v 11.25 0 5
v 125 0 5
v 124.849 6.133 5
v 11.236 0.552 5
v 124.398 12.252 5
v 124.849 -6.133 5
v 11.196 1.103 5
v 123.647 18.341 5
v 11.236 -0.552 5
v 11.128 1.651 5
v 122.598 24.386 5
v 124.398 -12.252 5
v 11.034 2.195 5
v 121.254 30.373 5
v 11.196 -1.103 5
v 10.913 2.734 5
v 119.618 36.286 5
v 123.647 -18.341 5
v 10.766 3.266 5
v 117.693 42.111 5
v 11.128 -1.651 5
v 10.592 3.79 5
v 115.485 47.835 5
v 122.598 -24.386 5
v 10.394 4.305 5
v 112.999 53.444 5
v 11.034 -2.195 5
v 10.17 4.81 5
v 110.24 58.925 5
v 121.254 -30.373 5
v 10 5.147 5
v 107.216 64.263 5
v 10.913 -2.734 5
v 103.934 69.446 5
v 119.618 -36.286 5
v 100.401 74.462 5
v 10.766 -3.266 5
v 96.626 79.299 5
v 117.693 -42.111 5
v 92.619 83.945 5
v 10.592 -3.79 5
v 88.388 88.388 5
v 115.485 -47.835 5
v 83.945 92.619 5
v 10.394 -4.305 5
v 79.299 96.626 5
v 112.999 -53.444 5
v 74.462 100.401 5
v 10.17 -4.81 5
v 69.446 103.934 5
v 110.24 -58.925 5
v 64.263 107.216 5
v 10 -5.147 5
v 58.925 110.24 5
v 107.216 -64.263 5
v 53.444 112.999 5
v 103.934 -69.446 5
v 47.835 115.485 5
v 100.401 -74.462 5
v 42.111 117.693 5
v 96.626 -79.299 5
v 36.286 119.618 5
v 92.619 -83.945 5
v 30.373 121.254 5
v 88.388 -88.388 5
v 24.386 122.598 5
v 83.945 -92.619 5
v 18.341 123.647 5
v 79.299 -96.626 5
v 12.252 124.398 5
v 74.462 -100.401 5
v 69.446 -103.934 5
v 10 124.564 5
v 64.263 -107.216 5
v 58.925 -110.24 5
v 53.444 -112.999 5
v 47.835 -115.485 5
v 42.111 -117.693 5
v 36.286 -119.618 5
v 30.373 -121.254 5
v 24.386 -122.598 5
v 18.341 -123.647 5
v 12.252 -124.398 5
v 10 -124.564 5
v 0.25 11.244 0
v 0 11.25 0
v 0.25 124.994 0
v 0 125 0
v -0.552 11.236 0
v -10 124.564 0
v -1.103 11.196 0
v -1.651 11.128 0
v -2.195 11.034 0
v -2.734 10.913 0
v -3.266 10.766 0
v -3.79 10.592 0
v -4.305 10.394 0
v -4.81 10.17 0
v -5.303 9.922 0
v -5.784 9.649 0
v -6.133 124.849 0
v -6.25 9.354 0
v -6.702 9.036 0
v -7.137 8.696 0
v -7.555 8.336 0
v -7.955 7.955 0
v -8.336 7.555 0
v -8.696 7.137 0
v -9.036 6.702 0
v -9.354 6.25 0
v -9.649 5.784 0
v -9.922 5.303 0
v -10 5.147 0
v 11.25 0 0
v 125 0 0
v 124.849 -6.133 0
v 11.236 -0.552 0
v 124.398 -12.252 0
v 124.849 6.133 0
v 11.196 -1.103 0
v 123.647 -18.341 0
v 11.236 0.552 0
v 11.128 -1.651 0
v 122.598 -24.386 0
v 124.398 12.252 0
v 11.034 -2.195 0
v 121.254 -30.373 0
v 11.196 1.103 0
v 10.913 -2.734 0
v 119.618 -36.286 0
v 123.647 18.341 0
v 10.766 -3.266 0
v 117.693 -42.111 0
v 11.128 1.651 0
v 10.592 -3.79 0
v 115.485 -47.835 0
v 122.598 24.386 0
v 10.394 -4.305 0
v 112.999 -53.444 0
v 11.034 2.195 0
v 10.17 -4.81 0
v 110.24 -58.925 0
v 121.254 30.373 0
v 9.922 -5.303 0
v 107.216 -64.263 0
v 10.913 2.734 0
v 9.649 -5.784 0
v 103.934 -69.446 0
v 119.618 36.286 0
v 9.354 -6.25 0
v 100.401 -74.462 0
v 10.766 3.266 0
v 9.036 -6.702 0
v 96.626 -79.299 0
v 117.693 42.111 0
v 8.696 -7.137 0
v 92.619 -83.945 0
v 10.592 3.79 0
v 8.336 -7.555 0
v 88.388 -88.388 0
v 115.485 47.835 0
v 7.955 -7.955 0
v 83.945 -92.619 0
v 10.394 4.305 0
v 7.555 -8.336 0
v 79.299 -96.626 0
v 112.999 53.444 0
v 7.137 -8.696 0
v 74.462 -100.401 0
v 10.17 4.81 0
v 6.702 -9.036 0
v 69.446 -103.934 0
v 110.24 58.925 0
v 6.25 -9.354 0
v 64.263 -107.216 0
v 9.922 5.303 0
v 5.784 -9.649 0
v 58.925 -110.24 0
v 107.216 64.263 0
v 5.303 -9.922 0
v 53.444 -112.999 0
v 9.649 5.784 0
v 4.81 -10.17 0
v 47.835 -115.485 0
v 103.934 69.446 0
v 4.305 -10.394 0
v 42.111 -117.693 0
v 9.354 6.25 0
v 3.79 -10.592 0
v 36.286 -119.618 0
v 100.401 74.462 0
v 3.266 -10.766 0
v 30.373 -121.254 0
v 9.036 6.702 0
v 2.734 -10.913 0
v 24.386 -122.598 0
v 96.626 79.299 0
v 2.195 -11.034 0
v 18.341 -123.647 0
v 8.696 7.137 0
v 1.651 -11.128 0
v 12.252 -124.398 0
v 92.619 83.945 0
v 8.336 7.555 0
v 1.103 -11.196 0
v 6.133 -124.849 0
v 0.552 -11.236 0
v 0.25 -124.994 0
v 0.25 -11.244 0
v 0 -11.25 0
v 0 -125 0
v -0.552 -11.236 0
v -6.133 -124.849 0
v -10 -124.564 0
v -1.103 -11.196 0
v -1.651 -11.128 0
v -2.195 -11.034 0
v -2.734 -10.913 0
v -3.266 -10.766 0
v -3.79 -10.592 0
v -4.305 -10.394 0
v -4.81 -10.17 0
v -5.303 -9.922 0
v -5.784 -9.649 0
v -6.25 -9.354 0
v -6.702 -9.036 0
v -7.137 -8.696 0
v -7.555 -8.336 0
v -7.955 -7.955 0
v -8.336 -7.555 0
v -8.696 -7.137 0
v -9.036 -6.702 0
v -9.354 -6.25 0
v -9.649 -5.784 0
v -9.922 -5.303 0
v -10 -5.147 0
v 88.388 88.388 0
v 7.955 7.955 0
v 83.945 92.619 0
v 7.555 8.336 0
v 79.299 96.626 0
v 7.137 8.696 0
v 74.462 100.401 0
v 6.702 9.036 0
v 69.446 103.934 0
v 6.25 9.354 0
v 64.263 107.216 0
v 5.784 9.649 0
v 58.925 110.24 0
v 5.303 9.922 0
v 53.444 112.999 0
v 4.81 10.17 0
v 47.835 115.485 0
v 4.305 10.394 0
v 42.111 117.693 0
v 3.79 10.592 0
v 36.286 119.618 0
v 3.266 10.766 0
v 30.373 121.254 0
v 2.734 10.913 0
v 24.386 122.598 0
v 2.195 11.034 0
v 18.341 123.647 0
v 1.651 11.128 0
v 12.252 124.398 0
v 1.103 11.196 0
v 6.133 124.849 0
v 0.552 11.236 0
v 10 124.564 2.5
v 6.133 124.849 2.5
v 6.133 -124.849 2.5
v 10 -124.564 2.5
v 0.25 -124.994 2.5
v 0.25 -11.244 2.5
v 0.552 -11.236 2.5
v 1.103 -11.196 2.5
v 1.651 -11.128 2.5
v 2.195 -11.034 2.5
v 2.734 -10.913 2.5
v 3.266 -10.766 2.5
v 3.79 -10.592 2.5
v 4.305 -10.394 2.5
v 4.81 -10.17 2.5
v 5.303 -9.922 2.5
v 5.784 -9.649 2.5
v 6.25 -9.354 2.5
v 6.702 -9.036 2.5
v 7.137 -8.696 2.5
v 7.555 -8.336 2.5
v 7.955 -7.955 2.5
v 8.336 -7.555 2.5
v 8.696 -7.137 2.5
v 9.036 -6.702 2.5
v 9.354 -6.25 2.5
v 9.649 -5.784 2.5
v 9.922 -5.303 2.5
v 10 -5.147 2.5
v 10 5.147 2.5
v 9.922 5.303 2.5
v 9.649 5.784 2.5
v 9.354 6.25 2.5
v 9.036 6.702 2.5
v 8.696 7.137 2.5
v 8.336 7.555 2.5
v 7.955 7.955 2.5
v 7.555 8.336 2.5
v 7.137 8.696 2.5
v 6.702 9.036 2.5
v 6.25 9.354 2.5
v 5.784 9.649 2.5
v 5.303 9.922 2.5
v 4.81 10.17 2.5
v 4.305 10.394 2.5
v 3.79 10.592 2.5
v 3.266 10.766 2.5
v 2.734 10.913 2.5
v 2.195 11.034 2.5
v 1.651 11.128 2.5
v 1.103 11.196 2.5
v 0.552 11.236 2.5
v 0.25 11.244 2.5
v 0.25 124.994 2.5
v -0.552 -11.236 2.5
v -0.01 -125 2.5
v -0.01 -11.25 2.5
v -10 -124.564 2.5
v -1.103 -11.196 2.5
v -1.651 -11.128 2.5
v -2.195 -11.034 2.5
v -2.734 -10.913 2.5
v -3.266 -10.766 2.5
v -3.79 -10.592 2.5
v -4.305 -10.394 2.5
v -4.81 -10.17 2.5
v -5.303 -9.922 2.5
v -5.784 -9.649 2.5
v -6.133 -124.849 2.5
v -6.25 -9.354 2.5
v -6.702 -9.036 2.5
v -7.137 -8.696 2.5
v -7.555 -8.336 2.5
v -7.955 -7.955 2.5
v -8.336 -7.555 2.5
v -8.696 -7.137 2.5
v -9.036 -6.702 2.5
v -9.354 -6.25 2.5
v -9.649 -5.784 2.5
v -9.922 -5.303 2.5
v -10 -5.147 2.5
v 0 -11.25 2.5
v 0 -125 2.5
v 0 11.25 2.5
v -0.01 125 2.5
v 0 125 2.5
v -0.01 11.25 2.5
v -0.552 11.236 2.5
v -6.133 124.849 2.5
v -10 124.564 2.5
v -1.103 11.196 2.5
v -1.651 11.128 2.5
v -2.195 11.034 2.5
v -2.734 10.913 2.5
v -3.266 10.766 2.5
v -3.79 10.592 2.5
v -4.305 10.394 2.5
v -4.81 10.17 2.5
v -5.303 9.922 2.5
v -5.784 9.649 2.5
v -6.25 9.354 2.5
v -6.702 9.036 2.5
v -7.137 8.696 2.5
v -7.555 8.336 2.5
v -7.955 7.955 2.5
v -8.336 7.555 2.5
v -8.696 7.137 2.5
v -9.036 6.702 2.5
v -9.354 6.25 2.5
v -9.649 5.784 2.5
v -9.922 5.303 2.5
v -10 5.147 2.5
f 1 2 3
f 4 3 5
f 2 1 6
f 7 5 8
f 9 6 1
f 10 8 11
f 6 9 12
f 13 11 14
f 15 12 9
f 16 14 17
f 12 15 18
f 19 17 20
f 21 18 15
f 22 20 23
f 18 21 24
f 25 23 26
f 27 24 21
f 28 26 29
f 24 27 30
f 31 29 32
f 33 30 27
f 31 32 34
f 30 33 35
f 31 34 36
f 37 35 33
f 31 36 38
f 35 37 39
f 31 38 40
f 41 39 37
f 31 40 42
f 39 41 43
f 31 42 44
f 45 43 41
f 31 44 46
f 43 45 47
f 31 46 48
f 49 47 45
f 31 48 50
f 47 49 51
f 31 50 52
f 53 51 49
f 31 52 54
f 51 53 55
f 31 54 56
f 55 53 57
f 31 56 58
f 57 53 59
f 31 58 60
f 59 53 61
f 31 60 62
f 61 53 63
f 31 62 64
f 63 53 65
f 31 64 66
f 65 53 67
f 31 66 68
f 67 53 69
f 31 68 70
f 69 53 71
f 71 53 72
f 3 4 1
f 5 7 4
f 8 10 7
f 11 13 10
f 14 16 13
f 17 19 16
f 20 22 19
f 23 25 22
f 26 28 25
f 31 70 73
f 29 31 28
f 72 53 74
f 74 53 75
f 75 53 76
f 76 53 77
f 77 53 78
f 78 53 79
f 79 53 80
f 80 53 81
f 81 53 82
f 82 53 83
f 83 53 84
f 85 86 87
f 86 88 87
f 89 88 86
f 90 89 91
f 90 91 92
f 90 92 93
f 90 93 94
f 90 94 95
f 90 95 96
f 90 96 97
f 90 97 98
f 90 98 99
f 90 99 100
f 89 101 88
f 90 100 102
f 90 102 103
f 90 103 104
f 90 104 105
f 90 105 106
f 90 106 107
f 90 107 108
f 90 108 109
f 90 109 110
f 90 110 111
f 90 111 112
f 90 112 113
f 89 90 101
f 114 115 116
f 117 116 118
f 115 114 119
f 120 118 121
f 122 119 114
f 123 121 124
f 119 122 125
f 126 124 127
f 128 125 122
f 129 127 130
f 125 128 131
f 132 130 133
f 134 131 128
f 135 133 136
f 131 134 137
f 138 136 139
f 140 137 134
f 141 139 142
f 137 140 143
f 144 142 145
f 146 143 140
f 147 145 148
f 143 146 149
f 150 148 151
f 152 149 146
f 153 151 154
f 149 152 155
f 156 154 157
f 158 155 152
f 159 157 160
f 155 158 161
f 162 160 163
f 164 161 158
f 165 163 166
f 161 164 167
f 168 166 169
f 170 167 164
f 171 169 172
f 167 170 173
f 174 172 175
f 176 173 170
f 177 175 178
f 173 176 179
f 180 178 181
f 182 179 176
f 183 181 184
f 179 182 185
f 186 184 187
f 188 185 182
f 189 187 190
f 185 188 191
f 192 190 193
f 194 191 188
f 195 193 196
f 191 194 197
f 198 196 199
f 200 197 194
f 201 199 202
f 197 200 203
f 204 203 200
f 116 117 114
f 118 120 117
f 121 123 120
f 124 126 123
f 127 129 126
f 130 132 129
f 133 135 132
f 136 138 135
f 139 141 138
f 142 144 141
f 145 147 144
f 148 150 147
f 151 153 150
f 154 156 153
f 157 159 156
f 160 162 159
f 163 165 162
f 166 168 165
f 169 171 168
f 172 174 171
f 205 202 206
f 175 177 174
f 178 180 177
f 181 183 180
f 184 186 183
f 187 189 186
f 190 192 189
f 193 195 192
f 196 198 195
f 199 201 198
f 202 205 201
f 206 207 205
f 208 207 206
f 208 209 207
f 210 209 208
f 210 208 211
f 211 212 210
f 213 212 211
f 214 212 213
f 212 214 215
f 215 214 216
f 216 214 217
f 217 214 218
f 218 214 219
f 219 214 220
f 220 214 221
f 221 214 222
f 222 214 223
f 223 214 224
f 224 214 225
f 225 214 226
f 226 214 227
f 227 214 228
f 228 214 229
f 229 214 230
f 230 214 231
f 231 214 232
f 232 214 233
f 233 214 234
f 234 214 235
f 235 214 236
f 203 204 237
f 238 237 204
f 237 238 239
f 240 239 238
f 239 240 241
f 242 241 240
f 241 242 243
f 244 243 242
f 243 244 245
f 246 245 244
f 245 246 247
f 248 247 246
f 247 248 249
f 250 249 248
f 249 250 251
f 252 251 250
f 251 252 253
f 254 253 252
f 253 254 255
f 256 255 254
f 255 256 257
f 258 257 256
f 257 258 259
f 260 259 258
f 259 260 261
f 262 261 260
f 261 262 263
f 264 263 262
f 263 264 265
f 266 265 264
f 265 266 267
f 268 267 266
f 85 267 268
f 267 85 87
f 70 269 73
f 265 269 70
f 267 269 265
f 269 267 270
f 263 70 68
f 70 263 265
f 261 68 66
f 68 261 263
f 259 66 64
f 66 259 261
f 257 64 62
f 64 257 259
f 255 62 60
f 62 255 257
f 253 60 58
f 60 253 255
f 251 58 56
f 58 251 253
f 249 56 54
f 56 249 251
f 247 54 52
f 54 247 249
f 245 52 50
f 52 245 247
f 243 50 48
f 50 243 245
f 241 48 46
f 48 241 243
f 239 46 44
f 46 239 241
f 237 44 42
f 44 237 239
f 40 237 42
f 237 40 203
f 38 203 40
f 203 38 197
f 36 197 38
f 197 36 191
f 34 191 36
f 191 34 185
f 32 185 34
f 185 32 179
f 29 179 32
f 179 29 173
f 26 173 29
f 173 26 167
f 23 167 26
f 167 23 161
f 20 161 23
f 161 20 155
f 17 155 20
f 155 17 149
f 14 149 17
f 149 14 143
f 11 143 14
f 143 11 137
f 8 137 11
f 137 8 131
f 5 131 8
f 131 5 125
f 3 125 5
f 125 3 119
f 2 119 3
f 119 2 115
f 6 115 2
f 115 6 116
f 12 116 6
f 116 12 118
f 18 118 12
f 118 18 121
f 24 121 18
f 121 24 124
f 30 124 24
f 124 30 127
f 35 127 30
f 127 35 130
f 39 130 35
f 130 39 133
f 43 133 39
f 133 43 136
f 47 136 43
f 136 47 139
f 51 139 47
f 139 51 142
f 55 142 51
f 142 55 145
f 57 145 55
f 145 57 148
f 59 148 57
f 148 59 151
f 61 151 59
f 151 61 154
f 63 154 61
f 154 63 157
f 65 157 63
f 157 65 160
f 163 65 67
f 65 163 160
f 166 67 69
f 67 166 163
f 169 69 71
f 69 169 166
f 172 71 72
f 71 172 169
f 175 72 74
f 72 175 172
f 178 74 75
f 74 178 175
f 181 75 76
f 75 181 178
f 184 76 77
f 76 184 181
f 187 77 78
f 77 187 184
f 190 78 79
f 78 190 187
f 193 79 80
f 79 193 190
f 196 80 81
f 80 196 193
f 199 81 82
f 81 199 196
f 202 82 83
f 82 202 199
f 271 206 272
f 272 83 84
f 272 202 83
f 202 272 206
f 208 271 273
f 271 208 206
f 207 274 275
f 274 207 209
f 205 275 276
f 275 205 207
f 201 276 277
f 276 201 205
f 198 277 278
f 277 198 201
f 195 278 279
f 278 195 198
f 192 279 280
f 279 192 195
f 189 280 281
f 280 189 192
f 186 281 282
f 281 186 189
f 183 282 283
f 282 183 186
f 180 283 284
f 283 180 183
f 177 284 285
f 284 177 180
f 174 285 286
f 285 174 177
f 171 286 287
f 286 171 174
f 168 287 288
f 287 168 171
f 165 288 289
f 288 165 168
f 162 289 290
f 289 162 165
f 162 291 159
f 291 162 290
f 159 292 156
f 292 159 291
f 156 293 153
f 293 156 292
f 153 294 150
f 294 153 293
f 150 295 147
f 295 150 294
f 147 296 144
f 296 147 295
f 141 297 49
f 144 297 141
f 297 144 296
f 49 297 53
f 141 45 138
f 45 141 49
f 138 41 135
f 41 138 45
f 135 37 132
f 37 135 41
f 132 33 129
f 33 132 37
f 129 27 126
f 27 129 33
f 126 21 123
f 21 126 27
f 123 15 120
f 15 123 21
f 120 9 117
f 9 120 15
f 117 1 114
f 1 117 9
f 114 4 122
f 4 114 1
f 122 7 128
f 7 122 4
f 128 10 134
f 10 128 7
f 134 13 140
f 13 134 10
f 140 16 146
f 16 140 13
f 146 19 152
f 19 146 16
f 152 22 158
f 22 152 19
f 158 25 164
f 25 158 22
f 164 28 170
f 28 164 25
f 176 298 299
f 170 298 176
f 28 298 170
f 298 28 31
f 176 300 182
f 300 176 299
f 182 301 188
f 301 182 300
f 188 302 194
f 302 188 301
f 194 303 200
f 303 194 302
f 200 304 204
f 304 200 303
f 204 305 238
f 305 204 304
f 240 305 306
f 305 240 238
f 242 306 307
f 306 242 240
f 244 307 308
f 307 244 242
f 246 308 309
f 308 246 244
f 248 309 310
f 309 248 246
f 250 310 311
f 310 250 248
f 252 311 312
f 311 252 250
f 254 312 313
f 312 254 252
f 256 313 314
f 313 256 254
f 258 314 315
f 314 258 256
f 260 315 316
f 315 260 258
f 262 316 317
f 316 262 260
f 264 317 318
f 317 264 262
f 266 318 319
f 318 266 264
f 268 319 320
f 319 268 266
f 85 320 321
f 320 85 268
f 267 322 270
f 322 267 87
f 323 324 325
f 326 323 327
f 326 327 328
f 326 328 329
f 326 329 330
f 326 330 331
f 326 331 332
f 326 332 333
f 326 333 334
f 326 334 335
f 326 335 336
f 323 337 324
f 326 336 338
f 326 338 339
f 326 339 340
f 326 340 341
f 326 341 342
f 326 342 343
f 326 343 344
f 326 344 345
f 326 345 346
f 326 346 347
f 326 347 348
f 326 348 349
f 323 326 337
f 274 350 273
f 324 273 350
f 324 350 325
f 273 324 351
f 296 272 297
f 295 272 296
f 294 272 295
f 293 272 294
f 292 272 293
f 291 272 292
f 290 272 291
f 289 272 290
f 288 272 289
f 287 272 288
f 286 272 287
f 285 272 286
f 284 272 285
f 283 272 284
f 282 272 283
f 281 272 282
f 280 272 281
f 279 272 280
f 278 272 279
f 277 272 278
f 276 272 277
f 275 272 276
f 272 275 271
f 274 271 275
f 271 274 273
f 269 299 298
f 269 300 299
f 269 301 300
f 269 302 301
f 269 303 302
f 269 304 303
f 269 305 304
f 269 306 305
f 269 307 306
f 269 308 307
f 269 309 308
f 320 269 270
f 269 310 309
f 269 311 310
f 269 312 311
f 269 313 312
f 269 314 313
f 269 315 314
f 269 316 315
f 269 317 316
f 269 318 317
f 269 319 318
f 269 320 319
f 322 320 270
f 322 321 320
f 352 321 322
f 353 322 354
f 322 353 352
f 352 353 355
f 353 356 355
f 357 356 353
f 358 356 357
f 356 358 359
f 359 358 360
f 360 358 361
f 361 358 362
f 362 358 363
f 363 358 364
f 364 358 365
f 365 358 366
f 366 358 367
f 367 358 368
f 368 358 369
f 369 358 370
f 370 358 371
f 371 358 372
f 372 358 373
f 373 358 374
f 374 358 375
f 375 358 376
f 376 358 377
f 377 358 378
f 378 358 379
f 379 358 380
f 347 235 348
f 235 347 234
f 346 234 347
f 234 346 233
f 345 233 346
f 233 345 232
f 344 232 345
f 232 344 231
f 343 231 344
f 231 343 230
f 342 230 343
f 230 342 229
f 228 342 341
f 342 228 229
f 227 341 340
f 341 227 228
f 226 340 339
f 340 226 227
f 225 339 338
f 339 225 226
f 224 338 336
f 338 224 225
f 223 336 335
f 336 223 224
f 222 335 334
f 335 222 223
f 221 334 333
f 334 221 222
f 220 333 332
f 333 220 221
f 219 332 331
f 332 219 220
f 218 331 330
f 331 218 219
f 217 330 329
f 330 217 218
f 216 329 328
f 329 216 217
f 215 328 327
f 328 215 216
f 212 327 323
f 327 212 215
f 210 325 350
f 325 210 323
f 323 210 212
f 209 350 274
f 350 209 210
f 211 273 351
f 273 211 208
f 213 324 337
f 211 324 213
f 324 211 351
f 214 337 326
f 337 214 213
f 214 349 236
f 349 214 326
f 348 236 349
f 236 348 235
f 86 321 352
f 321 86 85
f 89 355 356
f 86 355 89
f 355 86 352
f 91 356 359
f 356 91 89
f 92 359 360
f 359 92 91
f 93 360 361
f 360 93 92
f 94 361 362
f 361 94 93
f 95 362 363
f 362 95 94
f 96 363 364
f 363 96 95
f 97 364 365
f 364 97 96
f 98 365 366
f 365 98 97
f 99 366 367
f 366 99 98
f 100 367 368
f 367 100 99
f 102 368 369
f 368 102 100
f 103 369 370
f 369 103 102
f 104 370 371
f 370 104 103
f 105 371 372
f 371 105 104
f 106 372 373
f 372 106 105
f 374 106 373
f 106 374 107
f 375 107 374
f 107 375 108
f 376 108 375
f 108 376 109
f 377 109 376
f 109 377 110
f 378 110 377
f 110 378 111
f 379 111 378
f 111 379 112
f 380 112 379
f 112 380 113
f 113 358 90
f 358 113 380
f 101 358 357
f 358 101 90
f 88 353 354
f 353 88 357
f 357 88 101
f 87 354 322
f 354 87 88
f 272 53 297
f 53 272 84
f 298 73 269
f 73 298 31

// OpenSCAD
// file: ProjectGrace-RigidEndStop-Parts.scad
$fn = 128;

disc_diameter = 250;
disc_thickness = 5;
pipe_slot_width = 22.5;
lap_overlap_width = 10;
lap_seam_overlap = 0.25;
assembly_gap = 12;
assembly_offset = lap_overlap_width + assembly_gap / 2;

module pipe_entry_bore_2d() {
    circle(d = pipe_slot_width);
}

module pipe_entry_slot_2d(is_left) {
    slot_radius = pipe_slot_width / 2;

    intersection() {
        pipe_entry_bore_2d();

        if (is_left)
            translate([-slot_radius, -slot_radius])
                square([slot_radius, pipe_slot_width]);
        else
            translate([0, -slot_radius])
                square([slot_radius, pipe_slot_width]);
    }
}

module disc_half_outline_2d(is_left) {
    difference() {
        intersection() {
            circle(d = disc_diameter);

            if (is_left)
                translate([-disc_diameter / 2, -disc_diameter / 2])
                    square([disc_diameter / 2, disc_diameter]);
            else
                translate([0, -disc_diameter / 2])
                    square([disc_diameter / 2, disc_diameter]);
        }

        // Each half contributes one semicircular notch, forming a round hole when joined.
        pipe_entry_slot_2d(is_left);
    }
}

module lap_shelf_2d(extends_right) {
    difference() {
        intersection() {
            circle(d = disc_diameter);

            if (extends_right)
                translate([-lap_seam_overlap, -disc_diameter / 2 - 1])
                    square([lap_overlap_width + lap_seam_overlap, disc_diameter + 2]);
            else
                translate([-lap_overlap_width, -disc_diameter / 2 - 1])
                    square([lap_overlap_width + lap_seam_overlap, disc_diameter + 2]);
        }

        // Keep the complete pipe bore clear through the overlapping lap shelf.
        pipe_entry_bore_2d();
    }
}

module rigid_end_stop_part_a() {
    half_height = disc_thickness / 2;

    difference() {
        union() {
            linear_extrude(height = disc_thickness)
                disc_half_outline_2d(true);
            linear_extrude(height = half_height)
                lap_shelf_2d(true);
        }

        translate([-lap_overlap_width, -disc_diameter / 2 - 1, half_height])
            cube([lap_overlap_width + 0.01, disc_diameter + 2, half_height + 0.01]);
    }
}

module rigid_end_stop_part_b() {
    half_height = disc_thickness / 2;

    difference() {
        union() {
            linear_extrude(height = disc_thickness)
                disc_half_outline_2d(false);
            translate([0, 0, half_height])
                linear_extrude(height = half_height)
                    lap_shelf_2d(false);
        }

        translate([-0.01, -disc_diameter / 2 - 1, 0])
            cube([lap_overlap_width + 0.01, disc_diameter + 2, half_height]);
    }
}
// main file
// Part B is flipped so its half-height shelf rests flat on the print bed.

include <ProjectGrace-RigidEndStop-Parts.scad>

color("red")
    translate([0, 0, disc_thickness])
        rotate([180, 0, 0])
            rigid_end_stop_part_b();
